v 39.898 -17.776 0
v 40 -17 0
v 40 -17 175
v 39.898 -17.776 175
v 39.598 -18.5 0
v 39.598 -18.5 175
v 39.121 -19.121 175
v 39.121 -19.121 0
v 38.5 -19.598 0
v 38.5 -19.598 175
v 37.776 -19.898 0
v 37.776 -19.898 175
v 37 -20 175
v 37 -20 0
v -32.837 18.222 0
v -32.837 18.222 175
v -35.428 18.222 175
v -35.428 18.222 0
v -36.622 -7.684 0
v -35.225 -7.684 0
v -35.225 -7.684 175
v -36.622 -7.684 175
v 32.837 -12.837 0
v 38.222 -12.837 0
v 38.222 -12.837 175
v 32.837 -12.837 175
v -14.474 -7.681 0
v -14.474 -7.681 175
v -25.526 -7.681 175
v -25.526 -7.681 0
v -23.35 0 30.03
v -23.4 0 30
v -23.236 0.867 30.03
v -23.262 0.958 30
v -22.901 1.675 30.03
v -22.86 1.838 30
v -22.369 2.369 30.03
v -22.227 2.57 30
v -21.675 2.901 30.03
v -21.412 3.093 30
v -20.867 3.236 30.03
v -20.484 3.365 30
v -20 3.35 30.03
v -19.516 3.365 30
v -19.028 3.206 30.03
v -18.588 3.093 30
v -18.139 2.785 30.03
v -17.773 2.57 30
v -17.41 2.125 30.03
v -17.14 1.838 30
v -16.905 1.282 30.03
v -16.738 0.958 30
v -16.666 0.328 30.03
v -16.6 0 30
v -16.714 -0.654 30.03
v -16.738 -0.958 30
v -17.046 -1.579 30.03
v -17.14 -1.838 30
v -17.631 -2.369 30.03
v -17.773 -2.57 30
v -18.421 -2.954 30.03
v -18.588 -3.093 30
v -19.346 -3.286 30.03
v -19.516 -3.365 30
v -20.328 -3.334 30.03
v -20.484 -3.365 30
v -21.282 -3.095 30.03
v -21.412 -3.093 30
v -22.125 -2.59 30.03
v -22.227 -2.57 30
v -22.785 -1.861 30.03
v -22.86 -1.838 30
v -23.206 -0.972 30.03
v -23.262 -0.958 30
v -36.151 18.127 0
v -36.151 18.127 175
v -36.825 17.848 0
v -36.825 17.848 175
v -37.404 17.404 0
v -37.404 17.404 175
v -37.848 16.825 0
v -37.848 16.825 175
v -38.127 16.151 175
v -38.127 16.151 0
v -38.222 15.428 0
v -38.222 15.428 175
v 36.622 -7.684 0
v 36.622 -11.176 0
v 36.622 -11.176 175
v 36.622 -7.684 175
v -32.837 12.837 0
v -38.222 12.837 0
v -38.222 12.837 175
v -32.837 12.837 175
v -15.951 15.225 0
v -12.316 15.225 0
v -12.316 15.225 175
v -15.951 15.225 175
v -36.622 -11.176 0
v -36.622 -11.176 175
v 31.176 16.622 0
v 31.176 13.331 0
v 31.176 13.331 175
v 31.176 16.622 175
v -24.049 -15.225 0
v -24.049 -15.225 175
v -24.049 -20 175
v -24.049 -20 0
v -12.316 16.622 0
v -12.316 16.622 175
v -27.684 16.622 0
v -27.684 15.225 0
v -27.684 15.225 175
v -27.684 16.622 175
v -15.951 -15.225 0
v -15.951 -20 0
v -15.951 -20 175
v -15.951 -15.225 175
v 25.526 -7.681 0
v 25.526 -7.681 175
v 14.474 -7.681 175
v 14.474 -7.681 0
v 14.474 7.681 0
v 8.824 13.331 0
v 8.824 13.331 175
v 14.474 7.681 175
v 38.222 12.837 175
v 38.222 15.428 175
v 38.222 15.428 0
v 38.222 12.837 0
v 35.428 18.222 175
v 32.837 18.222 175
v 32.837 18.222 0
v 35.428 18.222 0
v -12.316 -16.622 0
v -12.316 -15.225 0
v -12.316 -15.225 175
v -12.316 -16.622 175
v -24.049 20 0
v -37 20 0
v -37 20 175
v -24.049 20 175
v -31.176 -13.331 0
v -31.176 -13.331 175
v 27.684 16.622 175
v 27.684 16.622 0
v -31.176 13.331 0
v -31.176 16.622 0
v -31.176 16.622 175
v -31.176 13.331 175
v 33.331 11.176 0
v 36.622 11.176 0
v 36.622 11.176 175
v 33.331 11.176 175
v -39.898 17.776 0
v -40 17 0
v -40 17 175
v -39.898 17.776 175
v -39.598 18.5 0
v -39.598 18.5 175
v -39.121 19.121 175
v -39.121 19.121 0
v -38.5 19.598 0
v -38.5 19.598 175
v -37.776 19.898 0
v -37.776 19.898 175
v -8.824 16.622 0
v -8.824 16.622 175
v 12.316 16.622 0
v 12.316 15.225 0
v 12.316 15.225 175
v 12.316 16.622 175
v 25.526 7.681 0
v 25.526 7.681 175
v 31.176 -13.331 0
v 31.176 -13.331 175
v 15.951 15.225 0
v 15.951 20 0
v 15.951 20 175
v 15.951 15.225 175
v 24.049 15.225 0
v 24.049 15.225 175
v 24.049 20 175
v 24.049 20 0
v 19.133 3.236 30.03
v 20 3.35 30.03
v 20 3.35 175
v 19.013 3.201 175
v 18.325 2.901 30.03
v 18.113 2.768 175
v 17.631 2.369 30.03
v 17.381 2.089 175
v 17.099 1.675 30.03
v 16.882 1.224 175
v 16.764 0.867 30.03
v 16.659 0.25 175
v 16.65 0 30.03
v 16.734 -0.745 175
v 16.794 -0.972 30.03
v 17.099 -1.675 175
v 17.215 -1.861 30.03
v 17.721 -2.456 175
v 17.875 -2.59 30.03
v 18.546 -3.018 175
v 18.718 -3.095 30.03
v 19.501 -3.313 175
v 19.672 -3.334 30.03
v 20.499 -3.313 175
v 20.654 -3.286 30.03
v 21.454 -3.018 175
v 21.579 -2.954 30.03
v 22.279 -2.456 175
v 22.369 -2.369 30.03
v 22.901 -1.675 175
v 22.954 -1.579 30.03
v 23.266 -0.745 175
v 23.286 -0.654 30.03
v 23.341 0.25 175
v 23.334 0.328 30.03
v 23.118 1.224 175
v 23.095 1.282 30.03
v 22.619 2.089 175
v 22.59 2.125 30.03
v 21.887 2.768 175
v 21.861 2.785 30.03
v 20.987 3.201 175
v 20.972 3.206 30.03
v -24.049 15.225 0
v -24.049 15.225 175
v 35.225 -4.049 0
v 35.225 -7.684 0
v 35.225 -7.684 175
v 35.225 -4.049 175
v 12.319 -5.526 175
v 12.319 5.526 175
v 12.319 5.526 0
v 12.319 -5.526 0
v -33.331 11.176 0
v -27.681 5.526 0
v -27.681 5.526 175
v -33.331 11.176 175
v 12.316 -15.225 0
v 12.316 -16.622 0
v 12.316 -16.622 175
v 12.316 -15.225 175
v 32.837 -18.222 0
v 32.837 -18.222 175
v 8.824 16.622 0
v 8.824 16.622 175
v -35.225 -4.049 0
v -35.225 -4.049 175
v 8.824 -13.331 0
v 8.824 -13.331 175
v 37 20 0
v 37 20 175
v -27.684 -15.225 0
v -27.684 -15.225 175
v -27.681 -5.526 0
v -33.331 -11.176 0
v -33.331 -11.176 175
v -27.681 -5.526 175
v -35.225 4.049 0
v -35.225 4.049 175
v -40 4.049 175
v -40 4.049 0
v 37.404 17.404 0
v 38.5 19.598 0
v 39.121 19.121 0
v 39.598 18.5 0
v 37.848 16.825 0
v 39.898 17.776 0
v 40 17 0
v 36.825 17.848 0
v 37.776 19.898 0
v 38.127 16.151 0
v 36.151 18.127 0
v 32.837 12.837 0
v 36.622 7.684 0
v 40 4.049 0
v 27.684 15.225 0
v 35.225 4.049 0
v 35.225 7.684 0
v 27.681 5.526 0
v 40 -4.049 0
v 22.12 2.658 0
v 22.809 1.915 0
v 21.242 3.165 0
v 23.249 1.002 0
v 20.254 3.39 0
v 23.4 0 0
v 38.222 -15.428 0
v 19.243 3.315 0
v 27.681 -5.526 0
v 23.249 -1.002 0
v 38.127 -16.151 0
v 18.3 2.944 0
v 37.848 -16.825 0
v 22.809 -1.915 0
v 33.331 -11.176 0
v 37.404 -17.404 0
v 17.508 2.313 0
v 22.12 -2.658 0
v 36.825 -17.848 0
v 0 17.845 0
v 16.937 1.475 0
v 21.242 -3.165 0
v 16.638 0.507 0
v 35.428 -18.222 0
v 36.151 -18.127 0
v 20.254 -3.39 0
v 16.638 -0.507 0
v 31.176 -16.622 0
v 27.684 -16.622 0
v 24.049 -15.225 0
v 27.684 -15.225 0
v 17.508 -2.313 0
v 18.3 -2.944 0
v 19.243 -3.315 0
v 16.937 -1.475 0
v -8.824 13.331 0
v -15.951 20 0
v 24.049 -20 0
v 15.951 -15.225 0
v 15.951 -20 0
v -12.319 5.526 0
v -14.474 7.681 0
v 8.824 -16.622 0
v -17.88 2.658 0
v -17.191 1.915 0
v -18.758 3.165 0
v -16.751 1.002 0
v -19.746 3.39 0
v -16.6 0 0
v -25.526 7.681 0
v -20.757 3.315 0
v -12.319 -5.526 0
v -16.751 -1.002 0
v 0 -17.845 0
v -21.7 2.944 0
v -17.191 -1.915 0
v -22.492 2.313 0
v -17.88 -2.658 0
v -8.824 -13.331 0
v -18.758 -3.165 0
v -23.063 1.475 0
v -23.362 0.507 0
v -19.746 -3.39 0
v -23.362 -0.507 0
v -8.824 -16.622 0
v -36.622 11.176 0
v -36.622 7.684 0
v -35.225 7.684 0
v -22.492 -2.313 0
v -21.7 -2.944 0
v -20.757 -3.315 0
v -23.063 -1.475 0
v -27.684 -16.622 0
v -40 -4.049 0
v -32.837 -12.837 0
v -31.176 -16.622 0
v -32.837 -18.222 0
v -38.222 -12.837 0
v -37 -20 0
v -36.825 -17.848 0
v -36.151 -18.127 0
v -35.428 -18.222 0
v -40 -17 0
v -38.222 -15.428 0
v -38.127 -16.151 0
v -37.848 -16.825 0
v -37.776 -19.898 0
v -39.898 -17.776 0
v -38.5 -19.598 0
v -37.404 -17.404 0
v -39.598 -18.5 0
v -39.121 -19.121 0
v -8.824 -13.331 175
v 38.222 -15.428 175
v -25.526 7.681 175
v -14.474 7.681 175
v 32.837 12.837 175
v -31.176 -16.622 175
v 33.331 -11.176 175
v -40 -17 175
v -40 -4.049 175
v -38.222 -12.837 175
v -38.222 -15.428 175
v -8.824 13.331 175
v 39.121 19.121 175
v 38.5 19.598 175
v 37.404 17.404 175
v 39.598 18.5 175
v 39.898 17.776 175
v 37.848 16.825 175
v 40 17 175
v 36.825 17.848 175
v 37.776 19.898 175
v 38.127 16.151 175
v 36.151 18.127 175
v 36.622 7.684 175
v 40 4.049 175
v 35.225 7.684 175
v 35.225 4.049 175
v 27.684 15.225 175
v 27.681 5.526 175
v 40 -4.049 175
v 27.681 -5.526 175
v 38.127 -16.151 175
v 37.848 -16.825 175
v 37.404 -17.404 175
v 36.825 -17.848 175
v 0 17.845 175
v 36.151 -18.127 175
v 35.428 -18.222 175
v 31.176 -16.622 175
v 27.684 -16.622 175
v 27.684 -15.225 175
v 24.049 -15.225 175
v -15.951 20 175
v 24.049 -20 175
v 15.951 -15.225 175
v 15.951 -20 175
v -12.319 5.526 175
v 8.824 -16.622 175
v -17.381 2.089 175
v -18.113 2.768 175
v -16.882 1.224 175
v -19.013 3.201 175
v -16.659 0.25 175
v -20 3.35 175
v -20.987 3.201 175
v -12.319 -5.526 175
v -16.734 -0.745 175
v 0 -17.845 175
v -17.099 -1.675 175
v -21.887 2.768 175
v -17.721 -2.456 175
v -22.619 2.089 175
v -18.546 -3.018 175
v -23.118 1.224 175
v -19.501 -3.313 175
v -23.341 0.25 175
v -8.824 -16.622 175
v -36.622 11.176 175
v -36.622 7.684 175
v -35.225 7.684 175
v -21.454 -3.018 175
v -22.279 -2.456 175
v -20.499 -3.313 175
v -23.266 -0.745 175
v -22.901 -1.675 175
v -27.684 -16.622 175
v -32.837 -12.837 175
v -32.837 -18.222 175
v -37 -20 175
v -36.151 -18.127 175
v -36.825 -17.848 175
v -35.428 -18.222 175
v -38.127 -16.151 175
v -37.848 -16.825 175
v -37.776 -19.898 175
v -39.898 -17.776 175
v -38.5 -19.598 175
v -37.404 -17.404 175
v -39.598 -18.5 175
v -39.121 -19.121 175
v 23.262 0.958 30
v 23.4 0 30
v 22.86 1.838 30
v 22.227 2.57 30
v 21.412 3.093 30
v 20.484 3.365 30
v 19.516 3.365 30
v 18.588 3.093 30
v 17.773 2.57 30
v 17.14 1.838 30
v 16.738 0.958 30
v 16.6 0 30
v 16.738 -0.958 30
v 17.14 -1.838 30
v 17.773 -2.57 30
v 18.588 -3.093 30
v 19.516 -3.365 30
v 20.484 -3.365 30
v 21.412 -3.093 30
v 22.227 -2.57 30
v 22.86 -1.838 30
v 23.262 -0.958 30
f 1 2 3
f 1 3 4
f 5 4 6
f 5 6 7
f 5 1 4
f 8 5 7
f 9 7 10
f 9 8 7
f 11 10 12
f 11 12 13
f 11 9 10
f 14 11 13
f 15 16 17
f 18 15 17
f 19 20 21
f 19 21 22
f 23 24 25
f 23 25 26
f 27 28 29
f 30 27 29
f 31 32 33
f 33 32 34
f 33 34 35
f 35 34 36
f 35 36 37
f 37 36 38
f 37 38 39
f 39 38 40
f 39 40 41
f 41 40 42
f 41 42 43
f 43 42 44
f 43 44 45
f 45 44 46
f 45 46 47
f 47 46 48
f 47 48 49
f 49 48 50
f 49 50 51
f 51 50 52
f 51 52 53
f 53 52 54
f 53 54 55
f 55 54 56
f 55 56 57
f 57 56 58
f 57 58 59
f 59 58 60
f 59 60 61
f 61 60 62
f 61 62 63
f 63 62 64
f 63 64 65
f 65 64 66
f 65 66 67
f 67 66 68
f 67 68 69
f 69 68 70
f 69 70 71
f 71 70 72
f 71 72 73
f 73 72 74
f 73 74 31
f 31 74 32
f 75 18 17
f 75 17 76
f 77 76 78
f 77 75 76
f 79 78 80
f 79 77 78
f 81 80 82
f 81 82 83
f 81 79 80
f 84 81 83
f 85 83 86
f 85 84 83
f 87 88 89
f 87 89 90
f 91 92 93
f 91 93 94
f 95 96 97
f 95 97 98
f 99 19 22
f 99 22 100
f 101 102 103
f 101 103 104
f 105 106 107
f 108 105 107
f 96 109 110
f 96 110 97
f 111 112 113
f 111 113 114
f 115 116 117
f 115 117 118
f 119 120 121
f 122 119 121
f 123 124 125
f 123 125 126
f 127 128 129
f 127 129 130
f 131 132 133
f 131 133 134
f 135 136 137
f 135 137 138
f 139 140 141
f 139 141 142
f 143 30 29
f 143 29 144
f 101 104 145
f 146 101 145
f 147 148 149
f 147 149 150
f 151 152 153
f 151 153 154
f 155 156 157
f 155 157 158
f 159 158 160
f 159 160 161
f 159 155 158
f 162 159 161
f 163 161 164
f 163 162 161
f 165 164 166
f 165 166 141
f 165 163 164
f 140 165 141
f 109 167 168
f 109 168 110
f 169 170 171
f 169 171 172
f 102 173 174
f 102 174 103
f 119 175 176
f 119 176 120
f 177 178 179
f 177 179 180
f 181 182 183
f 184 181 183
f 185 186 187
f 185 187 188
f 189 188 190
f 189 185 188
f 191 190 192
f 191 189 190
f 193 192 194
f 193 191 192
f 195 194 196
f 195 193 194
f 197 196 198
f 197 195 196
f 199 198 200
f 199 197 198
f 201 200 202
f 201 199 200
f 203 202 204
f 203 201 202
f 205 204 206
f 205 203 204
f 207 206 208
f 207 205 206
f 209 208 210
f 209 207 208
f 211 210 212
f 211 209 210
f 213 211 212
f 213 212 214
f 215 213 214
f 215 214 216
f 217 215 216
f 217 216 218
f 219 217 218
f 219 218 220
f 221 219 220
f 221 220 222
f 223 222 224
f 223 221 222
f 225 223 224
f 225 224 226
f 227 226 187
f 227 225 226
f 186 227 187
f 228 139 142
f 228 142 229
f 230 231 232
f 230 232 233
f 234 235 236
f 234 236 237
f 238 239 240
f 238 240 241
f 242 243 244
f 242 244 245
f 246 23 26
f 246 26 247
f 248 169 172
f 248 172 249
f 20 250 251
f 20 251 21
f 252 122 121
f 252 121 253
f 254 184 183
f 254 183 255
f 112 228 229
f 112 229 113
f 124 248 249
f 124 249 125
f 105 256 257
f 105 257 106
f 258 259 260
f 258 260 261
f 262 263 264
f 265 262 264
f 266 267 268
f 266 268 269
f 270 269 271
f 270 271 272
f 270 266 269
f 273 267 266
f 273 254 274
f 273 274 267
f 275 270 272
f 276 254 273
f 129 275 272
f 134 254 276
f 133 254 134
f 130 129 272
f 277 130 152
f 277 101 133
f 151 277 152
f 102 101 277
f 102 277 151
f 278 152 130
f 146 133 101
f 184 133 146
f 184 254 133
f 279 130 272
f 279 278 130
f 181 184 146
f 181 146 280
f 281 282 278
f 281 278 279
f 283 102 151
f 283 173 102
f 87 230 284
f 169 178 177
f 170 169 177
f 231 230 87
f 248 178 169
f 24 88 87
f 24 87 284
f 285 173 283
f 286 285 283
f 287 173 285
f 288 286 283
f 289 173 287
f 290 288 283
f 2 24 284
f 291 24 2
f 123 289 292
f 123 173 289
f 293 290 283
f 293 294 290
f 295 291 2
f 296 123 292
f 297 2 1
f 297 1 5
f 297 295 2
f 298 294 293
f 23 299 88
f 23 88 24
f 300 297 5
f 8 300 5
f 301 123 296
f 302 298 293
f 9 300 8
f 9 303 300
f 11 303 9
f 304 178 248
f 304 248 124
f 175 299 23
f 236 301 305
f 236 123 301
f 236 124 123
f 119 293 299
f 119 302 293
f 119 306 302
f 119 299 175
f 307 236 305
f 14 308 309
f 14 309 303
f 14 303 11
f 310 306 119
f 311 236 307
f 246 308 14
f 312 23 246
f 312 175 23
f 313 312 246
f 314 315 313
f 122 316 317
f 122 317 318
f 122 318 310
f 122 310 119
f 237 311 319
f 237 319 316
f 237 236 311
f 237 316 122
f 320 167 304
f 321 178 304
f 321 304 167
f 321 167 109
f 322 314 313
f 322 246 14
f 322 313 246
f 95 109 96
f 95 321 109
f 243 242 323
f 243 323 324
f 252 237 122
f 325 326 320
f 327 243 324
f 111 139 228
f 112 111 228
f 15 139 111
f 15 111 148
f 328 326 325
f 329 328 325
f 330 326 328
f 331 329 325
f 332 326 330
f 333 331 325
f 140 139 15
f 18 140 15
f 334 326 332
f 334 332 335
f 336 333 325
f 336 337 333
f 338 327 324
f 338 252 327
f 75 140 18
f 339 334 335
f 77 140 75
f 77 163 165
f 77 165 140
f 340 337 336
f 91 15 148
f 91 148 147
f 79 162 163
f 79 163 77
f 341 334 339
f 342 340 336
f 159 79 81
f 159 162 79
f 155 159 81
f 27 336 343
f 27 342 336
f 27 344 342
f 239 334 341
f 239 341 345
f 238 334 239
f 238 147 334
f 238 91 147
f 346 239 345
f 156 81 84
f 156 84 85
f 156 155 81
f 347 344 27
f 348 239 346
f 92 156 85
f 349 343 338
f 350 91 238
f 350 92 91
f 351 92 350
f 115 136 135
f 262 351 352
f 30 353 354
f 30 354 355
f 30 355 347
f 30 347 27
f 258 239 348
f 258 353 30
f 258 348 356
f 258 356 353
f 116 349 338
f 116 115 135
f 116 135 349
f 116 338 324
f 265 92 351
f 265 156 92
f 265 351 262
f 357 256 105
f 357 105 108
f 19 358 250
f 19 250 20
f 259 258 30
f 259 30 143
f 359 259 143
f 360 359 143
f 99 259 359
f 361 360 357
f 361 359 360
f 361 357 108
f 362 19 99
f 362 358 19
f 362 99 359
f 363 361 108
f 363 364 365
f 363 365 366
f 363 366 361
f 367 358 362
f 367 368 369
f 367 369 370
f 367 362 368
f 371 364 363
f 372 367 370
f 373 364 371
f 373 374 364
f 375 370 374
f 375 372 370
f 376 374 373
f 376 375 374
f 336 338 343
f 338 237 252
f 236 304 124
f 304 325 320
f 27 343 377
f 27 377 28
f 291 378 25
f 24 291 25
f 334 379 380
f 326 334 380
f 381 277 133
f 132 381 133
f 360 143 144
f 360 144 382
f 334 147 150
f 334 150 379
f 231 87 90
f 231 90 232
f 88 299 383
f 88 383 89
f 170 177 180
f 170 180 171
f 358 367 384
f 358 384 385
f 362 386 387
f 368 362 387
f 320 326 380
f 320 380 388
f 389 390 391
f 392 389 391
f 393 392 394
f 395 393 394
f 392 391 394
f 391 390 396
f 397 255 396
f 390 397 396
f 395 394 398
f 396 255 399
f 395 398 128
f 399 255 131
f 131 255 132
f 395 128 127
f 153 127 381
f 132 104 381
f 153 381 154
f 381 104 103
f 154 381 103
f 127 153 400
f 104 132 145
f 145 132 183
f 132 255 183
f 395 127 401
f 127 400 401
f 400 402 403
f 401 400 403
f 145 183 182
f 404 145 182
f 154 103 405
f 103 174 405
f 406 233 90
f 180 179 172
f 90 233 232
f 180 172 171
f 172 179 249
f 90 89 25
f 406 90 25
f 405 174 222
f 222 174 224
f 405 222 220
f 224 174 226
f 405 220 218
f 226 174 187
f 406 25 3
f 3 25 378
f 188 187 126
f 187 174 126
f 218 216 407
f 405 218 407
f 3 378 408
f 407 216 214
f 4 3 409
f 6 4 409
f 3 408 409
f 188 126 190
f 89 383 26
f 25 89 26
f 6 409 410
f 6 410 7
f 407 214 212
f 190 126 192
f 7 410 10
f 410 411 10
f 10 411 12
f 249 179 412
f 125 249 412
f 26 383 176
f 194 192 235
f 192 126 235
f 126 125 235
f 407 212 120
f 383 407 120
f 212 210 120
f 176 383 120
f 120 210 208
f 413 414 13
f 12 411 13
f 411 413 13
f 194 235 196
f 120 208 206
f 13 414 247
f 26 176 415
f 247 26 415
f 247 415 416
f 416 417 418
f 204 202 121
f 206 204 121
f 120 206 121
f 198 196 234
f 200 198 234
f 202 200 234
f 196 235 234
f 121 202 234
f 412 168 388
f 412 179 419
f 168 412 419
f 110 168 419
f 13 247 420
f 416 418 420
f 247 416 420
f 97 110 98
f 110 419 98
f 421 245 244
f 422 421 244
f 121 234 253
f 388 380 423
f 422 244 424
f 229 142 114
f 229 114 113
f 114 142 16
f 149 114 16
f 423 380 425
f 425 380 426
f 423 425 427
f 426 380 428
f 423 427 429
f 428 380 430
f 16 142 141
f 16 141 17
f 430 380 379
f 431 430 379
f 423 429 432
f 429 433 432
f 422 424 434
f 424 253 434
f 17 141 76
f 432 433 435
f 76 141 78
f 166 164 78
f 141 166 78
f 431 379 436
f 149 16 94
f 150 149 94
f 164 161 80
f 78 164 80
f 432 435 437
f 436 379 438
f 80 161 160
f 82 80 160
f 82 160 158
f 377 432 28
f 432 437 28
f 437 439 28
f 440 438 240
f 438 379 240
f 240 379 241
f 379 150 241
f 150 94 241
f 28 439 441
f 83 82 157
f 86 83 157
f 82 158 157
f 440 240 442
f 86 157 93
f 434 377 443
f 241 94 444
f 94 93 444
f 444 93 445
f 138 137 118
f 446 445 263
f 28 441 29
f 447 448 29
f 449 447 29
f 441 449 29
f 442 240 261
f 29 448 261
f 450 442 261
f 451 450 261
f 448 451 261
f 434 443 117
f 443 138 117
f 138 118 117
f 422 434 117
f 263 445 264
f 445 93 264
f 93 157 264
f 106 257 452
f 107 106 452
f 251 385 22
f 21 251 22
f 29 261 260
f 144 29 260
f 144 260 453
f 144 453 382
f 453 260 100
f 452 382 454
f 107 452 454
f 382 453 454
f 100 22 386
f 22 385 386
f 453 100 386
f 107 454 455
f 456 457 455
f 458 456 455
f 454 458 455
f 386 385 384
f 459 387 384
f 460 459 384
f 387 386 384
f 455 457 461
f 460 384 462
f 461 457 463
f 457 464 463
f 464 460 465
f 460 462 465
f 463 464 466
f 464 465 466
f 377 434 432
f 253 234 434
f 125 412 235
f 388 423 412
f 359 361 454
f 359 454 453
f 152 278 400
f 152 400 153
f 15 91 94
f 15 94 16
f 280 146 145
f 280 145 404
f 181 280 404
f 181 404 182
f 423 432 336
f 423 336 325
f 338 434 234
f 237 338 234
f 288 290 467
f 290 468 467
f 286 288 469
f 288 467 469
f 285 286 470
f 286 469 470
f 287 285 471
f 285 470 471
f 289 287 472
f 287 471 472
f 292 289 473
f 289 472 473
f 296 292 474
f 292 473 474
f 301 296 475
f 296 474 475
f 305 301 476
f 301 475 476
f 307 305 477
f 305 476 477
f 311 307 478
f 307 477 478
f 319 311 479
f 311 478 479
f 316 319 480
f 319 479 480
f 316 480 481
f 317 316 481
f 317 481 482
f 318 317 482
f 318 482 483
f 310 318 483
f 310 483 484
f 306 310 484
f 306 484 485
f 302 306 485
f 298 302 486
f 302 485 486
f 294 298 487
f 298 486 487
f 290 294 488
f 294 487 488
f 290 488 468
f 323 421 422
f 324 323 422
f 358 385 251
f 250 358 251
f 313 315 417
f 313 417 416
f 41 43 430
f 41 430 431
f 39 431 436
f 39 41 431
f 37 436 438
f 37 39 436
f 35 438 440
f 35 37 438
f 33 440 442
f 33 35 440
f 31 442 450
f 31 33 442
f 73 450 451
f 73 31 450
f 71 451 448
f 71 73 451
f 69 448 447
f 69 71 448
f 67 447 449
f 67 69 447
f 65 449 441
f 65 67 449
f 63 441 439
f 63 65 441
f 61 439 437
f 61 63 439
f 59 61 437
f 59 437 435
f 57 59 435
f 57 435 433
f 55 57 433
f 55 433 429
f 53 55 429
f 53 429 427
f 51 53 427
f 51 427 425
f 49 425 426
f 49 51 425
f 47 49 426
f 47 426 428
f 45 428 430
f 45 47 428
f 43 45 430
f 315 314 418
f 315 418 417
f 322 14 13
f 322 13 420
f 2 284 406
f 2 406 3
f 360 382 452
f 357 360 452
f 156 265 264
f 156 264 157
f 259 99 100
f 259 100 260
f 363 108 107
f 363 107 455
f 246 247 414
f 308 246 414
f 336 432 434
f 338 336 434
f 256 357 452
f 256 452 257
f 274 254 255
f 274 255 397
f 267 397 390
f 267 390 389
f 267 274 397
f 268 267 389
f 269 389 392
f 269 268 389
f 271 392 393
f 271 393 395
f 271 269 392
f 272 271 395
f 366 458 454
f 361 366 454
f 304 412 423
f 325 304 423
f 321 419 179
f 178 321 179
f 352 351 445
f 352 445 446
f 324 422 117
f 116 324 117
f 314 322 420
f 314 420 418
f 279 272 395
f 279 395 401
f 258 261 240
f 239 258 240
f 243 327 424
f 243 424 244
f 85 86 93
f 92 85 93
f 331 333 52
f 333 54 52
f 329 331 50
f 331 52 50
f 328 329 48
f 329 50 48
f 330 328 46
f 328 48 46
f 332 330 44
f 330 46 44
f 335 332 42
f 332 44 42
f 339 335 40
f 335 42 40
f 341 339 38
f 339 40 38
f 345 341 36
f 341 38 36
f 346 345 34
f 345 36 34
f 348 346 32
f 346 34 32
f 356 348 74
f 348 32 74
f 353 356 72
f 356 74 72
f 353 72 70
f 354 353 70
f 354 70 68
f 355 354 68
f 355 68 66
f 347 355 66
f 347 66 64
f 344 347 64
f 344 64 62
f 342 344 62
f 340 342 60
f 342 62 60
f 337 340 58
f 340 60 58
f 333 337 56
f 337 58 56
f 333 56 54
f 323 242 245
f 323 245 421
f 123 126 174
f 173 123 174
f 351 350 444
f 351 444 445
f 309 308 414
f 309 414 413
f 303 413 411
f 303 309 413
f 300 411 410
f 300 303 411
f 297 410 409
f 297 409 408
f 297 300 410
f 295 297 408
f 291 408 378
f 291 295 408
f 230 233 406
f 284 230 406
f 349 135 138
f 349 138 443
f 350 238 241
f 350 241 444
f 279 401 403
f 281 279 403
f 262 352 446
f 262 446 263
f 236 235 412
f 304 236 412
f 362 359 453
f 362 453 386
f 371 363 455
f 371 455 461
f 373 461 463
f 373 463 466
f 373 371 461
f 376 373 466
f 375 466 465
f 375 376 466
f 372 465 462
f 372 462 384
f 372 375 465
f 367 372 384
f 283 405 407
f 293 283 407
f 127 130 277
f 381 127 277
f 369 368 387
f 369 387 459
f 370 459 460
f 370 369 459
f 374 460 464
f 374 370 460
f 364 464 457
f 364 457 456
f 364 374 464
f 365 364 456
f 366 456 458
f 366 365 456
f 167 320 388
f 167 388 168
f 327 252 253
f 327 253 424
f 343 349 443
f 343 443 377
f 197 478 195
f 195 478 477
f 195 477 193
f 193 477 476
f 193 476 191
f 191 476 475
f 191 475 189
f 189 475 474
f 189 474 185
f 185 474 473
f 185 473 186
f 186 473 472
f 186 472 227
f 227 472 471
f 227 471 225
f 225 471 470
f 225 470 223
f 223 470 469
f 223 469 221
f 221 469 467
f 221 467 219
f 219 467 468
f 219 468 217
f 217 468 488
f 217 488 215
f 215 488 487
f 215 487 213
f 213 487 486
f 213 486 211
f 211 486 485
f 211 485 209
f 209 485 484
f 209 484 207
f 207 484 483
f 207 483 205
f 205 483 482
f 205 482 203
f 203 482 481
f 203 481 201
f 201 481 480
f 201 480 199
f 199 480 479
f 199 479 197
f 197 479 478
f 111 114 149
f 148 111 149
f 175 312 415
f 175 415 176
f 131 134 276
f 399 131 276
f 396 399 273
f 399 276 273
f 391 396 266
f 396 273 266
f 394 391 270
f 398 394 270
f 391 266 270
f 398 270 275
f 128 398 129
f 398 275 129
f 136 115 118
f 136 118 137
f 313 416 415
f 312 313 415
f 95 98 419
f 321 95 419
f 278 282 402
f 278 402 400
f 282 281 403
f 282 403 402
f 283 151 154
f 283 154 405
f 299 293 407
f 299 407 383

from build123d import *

# Parameters (mm, degrees)
SKETCH2_R                            = 3.35
F_40_SERIES_TS40_80LM_650037_1_DEPTH = 175
M8X1_25_TAPPED_HOLE1_D               = 6.8
M8X1_25_TAPPED_HOLE1_DEPTH           = 30
M8X1_25_TAPPED_HOLE1_TIP             = 2.042926105


with BuildPart() as part:
    # Sketch2 → 40 series TS40-80LM-650037(1) (new body)
    with BuildSketch(Plane(origin=(0, 0, 0), x_dir=(0, 1, 0), z_dir=(0, 0, 1))):
        with BuildLine():
            Line((0, -27.681), (-5.525738531, -27.681))
            Line((-5.525738531, -27.681), (-11.176, -33.331261469))
            Line((-11.176, -33.331261469), (-11.176, -36.6218))
            Line((-11.176, -36.6218), (-7.6835, -36.6218))
            Line((-7.6835, -36.6218), (-7.6835, -35.2248))
            Line((-7.6835, -35.2248), (-4.0488, -35.2248))
            Line((-4.0488, -35.2248), (-4.0488, -40))
            Line((-4.0488, -40), (-17, -40))
            ThreePointArc((-17, -40), (-19.121320344, -39.121320344), (-20, -37))
            Line((-20, -37), (-20, -24.0488))
            Line((-20, -24.0488), (-15.2248, -24.0488))
            Line((-15.2248, -24.0488), (-15.2248, -27.6835))
            Line((-15.2248, -27.6835), (-16.6218, -27.6835))
            Line((-16.6218, -27.6835), (-16.6218, -31.176))
            Line((-16.6218, -31.176), (-13.331261469, -31.176))
            Line((-13.331261469, -31.176), (-7.681, -25.525738531))
            Line((-7.681, -25.525738531), (-7.681, -20))
            Line((-7.681, -20), (-7.681, -14.474261469))
            Line((-7.681, -14.474261469), (-13.331261469, -8.824))
            Line((-13.331261469, -8.824), (-16.6218, -8.824))
            Line((-16.6218, -8.824), (-16.6218, -12.3165))
            Line((-16.6218, -12.3165), (-15.2248, -12.3165))
            Line((-15.2248, -12.3165), (-15.2248, -15.9512))
            Line((-15.2248, -15.9512), (-20, -15.9512))
            Line((-20, -15.9512), (-20, 15.9512))
            Line((-20, 15.9512), (-15.2248, 15.9512))
            Line((-15.2248, 15.9512), (-15.2248, 12.3165))
            Line((-15.2248, 12.3165), (-16.6218, 12.3165))
            Line((-16.6218, 12.3165), (-16.6218, 8.824))
            Line((-16.6218, 8.824), (-13.331261469, 8.824))
            Line((-13.331261469, 8.824), (-7.681, 14.474261469))
            Line((-7.681, 14.474261469), (-7.681, 25.525738531))
            Line((-7.681, 25.525738531), (-13.331261469, 31.176))
            Line((-13.331261469, 31.176), (-16.6218, 31.176))
            Line((-16.6218, 31.176), (-16.6218, 27.6835))
            Line((-16.6218, 27.6835), (-15.2248, 27.6835))
            Line((-15.2248, 27.6835), (-15.2248, 24.0488))
            Line((-15.2248, 24.0488), (-20, 24.0488))
            Line((-20, 24.0488), (-20, 37))
            ThreePointArc((-20, 37), (-19.121320344, 39.121320344), (-17, 40))
            Line((-17, 40), (-4.0488, 40))
            Line((-4.0488, 40), (-4.0488, 35.2248))
            Line((-4.0488, 35.2248), (-7.6835, 35.2248))
            Line((-7.6835, 35.2248), (-7.6835, 36.6218))
            Line((-7.6835, 36.6218), (-11.176, 36.6218))
            Line((-11.176, 36.6218), (-11.176, 33.331261469))
            Line((-11.176, 33.331261469), (-5.525738531, 27.681))
            Line((-5.525738531, 27.681), (0, 27.681))
            Line((0, 27.681), (5.525738531, 27.681))
            Line((5.525738531, 27.681), (11.176, 33.331261469))
            Line((11.176, 33.331261469), (11.176, 36.6218))
            Line((11.176, 36.6218), (7.6835, 36.6218))
            Line((7.6835, 36.6218), (7.6835, 35.2248))
            Line((7.6835, 35.2248), (4.0488, 35.2248))
            Line((4.0488, 35.2248), (4.0488, 40))
            Line((4.0488, 40), (17, 40))
            ThreePointArc((17, 40), (19.121320344, 39.121320344), (20, 37))
            Line((20, 37), (20, 24.0488))
            Line((20, 24.0488), (15.2248, 24.0488))
            Line((15.2248, 24.0488), (15.2248, 27.6835))
            Line((15.2248, 27.6835), (16.6218, 27.6835))
            Line((16.6218, 27.6835), (16.6218, 31.176))
            Line((16.6218, 31.176), (13.331261469, 31.176))
            Line((13.331261469, 31.176), (7.681, 25.525738531))
            Line((7.681, 25.525738531), (7.681, 20))
            Line((7.681, 20), (7.681, 14.474261469))
            Line((7.681, 14.474261469), (13.331261469, 8.824))
            Line((13.331261469, 8.824), (16.6218, 8.824))
            Line((16.6218, 8.824), (16.6218, 12.3165))
            Line((16.6218, 12.3165), (15.2248, 12.3165))
            Line((15.2248, 12.3165), (15.2248, 15.9512))
            Line((15.2248, 15.9512), (20, 15.9512))
            Line((20, 15.9512), (20, -15.9512))
            Line((20, -15.9512), (15.2248, -15.9512))
            Line((15.2248, -15.9512), (15.2248, -12.3165))
            Line((15.2248, -12.3165), (16.6218, -12.3165))
            Line((16.6218, -12.3165), (16.6218, -8.824))
            Line((16.6218, -8.824), (13.331261469, -8.824))
            Line((13.331261469, -8.824), (7.681, -14.474261469))
            Line((7.681, -14.474261469), (7.681, -20))
            Line((7.681, -20), (7.681, -25.525738531))
            Line((7.681, -25.525738531), (13.331261469, -31.176))
            Line((13.331261469, -31.176), (16.6218, -31.176))
            Line((16.6218, -31.176), (16.6218, -27.6835))
            Line((16.6218, -27.6835), (15.2248, -27.6835))
            Line((15.2248, -27.6835), (15.2248, -24.0488))
            Line((15.2248, -24.0488), (20, -24.0488))
            Line((20, -24.0488), (20, -37))
            ThreePointArc((20, -37), (19.121320344, -39.121320344), (17, -40))
            Line((17, -40), (4.0488, -40))
            Line((4.0488, -40), (4.0488, -35.2248))
            Line((4.0488, -35.2248), (7.6835, -35.2248))
            Line((7.6835, -35.2248), (7.6835, -36.6218))
            Line((7.6835, -36.6218), (11.176, -36.6218))
            Line((11.176, -36.6218), (11.176, -33.331261469))
            Line((11.176, -33.331261469), (5.525738531, -27.681))
            Line((5.525738531, -27.681), (0, -27.681))
        make_face()
        with Locations((0, -20)):
            Circle(SKETCH2_R, mode=Mode.SUBTRACT)
        with Locations((0, 20)):
            Circle(SKETCH2_R, mode=Mode.SUBTRACT)
        Polygon((-5.525738531, 12.319), (-17.844738531, 0), (-5.525738531, -12.319), (0, -12.319), (5.525738531, -12.319), (17.844738531, 0), (5.525738531, 12.319), (0, 12.319), align=None, mode=Mode.SUBTRACT)
        with BuildLine():
            Line((12.8372, 38.222), (12.8372, 32.8372))
            Line((12.8372, 32.8372), (18.222, 32.8372))
            Line((18.222, 32.8372), (18.222, 35.428))
            ThreePointArc((18.222, 35.428), (17.403656347, 37.403656347), (15.428, 38.222))
            Line((15.428, 38.222), (12.8372, 38.222))
        make_face(mode=Mode.SUBTRACT)
        with BuildLine():
            Line((12.8372, -32.8372), (18.222, -32.8372))
            Line((18.222, -32.8372), (18.222, -35.428))
            ThreePointArc((18.222, -35.428), (17.403656347, -37.403656347), (15.428, -38.222))
            Line((15.428, -38.222), (12.8372, -38.222))
            Line((12.8372, -38.222), (12.8372, -32.8372))
        make_face(mode=Mode.SUBTRACT)
        with BuildLine():
            Line((-12.8372, -38.222), (-12.8372, -32.8372))
            Line((-12.8372, -32.8372), (-18.222, -32.8372))
            Line((-18.222, -32.8372), (-18.222, -35.428))
            ThreePointArc((-18.222, -35.428), (-17.403656347, -37.403656347), (-15.428, -38.222))
            Line((-15.428, -38.222), (-12.8372, -38.222))
        make_face(mode=Mode.SUBTRACT)
        with BuildLine():
            Line((-18.222, 35.428), (-18.222, 32.8372))
            Line((-18.222, 32.8372), (-12.8372, 32.8372))
            Line((-12.8372, 32.8372), (-12.8372, 38.222))
            Line((-12.8372, 38.222), (-15.428, 38.222))
            ThreePointArc((-15.428, 38.222), (-17.403656347, 37.403656347), (-18.222, 35.428))
        make_face(mode=Mode.SUBTRACT)
    extrude(amount=F_40_SERIES_TS40_80LM_650037_1_DEPTH)

    # M8x1.25 Tapped Hole1
    with Locations(Plane(origin=(0, 0, 0), x_dir=(-1, 0, 0), z_dir=(0, 0, -1))):
        with Locations((-20, 0), (20, 0)):
            Hole(M8X1_25_TAPPED_HOLE1_D / 2, depth=M8X1_25_TAPPED_HOLE1_DEPTH)
            with Locations((0, 0, -(M8X1_25_TAPPED_HOLE1_DEPTH + M8X1_25_TAPPED_HOLE1_TIP / 2))):  # 118° drill point
                Cone(0, M8X1_25_TAPPED_HOLE1_D / 2, M8X1_25_TAPPED_HOLE1_TIP, mode=Mode.SUBTRACT)


solid = part.part
